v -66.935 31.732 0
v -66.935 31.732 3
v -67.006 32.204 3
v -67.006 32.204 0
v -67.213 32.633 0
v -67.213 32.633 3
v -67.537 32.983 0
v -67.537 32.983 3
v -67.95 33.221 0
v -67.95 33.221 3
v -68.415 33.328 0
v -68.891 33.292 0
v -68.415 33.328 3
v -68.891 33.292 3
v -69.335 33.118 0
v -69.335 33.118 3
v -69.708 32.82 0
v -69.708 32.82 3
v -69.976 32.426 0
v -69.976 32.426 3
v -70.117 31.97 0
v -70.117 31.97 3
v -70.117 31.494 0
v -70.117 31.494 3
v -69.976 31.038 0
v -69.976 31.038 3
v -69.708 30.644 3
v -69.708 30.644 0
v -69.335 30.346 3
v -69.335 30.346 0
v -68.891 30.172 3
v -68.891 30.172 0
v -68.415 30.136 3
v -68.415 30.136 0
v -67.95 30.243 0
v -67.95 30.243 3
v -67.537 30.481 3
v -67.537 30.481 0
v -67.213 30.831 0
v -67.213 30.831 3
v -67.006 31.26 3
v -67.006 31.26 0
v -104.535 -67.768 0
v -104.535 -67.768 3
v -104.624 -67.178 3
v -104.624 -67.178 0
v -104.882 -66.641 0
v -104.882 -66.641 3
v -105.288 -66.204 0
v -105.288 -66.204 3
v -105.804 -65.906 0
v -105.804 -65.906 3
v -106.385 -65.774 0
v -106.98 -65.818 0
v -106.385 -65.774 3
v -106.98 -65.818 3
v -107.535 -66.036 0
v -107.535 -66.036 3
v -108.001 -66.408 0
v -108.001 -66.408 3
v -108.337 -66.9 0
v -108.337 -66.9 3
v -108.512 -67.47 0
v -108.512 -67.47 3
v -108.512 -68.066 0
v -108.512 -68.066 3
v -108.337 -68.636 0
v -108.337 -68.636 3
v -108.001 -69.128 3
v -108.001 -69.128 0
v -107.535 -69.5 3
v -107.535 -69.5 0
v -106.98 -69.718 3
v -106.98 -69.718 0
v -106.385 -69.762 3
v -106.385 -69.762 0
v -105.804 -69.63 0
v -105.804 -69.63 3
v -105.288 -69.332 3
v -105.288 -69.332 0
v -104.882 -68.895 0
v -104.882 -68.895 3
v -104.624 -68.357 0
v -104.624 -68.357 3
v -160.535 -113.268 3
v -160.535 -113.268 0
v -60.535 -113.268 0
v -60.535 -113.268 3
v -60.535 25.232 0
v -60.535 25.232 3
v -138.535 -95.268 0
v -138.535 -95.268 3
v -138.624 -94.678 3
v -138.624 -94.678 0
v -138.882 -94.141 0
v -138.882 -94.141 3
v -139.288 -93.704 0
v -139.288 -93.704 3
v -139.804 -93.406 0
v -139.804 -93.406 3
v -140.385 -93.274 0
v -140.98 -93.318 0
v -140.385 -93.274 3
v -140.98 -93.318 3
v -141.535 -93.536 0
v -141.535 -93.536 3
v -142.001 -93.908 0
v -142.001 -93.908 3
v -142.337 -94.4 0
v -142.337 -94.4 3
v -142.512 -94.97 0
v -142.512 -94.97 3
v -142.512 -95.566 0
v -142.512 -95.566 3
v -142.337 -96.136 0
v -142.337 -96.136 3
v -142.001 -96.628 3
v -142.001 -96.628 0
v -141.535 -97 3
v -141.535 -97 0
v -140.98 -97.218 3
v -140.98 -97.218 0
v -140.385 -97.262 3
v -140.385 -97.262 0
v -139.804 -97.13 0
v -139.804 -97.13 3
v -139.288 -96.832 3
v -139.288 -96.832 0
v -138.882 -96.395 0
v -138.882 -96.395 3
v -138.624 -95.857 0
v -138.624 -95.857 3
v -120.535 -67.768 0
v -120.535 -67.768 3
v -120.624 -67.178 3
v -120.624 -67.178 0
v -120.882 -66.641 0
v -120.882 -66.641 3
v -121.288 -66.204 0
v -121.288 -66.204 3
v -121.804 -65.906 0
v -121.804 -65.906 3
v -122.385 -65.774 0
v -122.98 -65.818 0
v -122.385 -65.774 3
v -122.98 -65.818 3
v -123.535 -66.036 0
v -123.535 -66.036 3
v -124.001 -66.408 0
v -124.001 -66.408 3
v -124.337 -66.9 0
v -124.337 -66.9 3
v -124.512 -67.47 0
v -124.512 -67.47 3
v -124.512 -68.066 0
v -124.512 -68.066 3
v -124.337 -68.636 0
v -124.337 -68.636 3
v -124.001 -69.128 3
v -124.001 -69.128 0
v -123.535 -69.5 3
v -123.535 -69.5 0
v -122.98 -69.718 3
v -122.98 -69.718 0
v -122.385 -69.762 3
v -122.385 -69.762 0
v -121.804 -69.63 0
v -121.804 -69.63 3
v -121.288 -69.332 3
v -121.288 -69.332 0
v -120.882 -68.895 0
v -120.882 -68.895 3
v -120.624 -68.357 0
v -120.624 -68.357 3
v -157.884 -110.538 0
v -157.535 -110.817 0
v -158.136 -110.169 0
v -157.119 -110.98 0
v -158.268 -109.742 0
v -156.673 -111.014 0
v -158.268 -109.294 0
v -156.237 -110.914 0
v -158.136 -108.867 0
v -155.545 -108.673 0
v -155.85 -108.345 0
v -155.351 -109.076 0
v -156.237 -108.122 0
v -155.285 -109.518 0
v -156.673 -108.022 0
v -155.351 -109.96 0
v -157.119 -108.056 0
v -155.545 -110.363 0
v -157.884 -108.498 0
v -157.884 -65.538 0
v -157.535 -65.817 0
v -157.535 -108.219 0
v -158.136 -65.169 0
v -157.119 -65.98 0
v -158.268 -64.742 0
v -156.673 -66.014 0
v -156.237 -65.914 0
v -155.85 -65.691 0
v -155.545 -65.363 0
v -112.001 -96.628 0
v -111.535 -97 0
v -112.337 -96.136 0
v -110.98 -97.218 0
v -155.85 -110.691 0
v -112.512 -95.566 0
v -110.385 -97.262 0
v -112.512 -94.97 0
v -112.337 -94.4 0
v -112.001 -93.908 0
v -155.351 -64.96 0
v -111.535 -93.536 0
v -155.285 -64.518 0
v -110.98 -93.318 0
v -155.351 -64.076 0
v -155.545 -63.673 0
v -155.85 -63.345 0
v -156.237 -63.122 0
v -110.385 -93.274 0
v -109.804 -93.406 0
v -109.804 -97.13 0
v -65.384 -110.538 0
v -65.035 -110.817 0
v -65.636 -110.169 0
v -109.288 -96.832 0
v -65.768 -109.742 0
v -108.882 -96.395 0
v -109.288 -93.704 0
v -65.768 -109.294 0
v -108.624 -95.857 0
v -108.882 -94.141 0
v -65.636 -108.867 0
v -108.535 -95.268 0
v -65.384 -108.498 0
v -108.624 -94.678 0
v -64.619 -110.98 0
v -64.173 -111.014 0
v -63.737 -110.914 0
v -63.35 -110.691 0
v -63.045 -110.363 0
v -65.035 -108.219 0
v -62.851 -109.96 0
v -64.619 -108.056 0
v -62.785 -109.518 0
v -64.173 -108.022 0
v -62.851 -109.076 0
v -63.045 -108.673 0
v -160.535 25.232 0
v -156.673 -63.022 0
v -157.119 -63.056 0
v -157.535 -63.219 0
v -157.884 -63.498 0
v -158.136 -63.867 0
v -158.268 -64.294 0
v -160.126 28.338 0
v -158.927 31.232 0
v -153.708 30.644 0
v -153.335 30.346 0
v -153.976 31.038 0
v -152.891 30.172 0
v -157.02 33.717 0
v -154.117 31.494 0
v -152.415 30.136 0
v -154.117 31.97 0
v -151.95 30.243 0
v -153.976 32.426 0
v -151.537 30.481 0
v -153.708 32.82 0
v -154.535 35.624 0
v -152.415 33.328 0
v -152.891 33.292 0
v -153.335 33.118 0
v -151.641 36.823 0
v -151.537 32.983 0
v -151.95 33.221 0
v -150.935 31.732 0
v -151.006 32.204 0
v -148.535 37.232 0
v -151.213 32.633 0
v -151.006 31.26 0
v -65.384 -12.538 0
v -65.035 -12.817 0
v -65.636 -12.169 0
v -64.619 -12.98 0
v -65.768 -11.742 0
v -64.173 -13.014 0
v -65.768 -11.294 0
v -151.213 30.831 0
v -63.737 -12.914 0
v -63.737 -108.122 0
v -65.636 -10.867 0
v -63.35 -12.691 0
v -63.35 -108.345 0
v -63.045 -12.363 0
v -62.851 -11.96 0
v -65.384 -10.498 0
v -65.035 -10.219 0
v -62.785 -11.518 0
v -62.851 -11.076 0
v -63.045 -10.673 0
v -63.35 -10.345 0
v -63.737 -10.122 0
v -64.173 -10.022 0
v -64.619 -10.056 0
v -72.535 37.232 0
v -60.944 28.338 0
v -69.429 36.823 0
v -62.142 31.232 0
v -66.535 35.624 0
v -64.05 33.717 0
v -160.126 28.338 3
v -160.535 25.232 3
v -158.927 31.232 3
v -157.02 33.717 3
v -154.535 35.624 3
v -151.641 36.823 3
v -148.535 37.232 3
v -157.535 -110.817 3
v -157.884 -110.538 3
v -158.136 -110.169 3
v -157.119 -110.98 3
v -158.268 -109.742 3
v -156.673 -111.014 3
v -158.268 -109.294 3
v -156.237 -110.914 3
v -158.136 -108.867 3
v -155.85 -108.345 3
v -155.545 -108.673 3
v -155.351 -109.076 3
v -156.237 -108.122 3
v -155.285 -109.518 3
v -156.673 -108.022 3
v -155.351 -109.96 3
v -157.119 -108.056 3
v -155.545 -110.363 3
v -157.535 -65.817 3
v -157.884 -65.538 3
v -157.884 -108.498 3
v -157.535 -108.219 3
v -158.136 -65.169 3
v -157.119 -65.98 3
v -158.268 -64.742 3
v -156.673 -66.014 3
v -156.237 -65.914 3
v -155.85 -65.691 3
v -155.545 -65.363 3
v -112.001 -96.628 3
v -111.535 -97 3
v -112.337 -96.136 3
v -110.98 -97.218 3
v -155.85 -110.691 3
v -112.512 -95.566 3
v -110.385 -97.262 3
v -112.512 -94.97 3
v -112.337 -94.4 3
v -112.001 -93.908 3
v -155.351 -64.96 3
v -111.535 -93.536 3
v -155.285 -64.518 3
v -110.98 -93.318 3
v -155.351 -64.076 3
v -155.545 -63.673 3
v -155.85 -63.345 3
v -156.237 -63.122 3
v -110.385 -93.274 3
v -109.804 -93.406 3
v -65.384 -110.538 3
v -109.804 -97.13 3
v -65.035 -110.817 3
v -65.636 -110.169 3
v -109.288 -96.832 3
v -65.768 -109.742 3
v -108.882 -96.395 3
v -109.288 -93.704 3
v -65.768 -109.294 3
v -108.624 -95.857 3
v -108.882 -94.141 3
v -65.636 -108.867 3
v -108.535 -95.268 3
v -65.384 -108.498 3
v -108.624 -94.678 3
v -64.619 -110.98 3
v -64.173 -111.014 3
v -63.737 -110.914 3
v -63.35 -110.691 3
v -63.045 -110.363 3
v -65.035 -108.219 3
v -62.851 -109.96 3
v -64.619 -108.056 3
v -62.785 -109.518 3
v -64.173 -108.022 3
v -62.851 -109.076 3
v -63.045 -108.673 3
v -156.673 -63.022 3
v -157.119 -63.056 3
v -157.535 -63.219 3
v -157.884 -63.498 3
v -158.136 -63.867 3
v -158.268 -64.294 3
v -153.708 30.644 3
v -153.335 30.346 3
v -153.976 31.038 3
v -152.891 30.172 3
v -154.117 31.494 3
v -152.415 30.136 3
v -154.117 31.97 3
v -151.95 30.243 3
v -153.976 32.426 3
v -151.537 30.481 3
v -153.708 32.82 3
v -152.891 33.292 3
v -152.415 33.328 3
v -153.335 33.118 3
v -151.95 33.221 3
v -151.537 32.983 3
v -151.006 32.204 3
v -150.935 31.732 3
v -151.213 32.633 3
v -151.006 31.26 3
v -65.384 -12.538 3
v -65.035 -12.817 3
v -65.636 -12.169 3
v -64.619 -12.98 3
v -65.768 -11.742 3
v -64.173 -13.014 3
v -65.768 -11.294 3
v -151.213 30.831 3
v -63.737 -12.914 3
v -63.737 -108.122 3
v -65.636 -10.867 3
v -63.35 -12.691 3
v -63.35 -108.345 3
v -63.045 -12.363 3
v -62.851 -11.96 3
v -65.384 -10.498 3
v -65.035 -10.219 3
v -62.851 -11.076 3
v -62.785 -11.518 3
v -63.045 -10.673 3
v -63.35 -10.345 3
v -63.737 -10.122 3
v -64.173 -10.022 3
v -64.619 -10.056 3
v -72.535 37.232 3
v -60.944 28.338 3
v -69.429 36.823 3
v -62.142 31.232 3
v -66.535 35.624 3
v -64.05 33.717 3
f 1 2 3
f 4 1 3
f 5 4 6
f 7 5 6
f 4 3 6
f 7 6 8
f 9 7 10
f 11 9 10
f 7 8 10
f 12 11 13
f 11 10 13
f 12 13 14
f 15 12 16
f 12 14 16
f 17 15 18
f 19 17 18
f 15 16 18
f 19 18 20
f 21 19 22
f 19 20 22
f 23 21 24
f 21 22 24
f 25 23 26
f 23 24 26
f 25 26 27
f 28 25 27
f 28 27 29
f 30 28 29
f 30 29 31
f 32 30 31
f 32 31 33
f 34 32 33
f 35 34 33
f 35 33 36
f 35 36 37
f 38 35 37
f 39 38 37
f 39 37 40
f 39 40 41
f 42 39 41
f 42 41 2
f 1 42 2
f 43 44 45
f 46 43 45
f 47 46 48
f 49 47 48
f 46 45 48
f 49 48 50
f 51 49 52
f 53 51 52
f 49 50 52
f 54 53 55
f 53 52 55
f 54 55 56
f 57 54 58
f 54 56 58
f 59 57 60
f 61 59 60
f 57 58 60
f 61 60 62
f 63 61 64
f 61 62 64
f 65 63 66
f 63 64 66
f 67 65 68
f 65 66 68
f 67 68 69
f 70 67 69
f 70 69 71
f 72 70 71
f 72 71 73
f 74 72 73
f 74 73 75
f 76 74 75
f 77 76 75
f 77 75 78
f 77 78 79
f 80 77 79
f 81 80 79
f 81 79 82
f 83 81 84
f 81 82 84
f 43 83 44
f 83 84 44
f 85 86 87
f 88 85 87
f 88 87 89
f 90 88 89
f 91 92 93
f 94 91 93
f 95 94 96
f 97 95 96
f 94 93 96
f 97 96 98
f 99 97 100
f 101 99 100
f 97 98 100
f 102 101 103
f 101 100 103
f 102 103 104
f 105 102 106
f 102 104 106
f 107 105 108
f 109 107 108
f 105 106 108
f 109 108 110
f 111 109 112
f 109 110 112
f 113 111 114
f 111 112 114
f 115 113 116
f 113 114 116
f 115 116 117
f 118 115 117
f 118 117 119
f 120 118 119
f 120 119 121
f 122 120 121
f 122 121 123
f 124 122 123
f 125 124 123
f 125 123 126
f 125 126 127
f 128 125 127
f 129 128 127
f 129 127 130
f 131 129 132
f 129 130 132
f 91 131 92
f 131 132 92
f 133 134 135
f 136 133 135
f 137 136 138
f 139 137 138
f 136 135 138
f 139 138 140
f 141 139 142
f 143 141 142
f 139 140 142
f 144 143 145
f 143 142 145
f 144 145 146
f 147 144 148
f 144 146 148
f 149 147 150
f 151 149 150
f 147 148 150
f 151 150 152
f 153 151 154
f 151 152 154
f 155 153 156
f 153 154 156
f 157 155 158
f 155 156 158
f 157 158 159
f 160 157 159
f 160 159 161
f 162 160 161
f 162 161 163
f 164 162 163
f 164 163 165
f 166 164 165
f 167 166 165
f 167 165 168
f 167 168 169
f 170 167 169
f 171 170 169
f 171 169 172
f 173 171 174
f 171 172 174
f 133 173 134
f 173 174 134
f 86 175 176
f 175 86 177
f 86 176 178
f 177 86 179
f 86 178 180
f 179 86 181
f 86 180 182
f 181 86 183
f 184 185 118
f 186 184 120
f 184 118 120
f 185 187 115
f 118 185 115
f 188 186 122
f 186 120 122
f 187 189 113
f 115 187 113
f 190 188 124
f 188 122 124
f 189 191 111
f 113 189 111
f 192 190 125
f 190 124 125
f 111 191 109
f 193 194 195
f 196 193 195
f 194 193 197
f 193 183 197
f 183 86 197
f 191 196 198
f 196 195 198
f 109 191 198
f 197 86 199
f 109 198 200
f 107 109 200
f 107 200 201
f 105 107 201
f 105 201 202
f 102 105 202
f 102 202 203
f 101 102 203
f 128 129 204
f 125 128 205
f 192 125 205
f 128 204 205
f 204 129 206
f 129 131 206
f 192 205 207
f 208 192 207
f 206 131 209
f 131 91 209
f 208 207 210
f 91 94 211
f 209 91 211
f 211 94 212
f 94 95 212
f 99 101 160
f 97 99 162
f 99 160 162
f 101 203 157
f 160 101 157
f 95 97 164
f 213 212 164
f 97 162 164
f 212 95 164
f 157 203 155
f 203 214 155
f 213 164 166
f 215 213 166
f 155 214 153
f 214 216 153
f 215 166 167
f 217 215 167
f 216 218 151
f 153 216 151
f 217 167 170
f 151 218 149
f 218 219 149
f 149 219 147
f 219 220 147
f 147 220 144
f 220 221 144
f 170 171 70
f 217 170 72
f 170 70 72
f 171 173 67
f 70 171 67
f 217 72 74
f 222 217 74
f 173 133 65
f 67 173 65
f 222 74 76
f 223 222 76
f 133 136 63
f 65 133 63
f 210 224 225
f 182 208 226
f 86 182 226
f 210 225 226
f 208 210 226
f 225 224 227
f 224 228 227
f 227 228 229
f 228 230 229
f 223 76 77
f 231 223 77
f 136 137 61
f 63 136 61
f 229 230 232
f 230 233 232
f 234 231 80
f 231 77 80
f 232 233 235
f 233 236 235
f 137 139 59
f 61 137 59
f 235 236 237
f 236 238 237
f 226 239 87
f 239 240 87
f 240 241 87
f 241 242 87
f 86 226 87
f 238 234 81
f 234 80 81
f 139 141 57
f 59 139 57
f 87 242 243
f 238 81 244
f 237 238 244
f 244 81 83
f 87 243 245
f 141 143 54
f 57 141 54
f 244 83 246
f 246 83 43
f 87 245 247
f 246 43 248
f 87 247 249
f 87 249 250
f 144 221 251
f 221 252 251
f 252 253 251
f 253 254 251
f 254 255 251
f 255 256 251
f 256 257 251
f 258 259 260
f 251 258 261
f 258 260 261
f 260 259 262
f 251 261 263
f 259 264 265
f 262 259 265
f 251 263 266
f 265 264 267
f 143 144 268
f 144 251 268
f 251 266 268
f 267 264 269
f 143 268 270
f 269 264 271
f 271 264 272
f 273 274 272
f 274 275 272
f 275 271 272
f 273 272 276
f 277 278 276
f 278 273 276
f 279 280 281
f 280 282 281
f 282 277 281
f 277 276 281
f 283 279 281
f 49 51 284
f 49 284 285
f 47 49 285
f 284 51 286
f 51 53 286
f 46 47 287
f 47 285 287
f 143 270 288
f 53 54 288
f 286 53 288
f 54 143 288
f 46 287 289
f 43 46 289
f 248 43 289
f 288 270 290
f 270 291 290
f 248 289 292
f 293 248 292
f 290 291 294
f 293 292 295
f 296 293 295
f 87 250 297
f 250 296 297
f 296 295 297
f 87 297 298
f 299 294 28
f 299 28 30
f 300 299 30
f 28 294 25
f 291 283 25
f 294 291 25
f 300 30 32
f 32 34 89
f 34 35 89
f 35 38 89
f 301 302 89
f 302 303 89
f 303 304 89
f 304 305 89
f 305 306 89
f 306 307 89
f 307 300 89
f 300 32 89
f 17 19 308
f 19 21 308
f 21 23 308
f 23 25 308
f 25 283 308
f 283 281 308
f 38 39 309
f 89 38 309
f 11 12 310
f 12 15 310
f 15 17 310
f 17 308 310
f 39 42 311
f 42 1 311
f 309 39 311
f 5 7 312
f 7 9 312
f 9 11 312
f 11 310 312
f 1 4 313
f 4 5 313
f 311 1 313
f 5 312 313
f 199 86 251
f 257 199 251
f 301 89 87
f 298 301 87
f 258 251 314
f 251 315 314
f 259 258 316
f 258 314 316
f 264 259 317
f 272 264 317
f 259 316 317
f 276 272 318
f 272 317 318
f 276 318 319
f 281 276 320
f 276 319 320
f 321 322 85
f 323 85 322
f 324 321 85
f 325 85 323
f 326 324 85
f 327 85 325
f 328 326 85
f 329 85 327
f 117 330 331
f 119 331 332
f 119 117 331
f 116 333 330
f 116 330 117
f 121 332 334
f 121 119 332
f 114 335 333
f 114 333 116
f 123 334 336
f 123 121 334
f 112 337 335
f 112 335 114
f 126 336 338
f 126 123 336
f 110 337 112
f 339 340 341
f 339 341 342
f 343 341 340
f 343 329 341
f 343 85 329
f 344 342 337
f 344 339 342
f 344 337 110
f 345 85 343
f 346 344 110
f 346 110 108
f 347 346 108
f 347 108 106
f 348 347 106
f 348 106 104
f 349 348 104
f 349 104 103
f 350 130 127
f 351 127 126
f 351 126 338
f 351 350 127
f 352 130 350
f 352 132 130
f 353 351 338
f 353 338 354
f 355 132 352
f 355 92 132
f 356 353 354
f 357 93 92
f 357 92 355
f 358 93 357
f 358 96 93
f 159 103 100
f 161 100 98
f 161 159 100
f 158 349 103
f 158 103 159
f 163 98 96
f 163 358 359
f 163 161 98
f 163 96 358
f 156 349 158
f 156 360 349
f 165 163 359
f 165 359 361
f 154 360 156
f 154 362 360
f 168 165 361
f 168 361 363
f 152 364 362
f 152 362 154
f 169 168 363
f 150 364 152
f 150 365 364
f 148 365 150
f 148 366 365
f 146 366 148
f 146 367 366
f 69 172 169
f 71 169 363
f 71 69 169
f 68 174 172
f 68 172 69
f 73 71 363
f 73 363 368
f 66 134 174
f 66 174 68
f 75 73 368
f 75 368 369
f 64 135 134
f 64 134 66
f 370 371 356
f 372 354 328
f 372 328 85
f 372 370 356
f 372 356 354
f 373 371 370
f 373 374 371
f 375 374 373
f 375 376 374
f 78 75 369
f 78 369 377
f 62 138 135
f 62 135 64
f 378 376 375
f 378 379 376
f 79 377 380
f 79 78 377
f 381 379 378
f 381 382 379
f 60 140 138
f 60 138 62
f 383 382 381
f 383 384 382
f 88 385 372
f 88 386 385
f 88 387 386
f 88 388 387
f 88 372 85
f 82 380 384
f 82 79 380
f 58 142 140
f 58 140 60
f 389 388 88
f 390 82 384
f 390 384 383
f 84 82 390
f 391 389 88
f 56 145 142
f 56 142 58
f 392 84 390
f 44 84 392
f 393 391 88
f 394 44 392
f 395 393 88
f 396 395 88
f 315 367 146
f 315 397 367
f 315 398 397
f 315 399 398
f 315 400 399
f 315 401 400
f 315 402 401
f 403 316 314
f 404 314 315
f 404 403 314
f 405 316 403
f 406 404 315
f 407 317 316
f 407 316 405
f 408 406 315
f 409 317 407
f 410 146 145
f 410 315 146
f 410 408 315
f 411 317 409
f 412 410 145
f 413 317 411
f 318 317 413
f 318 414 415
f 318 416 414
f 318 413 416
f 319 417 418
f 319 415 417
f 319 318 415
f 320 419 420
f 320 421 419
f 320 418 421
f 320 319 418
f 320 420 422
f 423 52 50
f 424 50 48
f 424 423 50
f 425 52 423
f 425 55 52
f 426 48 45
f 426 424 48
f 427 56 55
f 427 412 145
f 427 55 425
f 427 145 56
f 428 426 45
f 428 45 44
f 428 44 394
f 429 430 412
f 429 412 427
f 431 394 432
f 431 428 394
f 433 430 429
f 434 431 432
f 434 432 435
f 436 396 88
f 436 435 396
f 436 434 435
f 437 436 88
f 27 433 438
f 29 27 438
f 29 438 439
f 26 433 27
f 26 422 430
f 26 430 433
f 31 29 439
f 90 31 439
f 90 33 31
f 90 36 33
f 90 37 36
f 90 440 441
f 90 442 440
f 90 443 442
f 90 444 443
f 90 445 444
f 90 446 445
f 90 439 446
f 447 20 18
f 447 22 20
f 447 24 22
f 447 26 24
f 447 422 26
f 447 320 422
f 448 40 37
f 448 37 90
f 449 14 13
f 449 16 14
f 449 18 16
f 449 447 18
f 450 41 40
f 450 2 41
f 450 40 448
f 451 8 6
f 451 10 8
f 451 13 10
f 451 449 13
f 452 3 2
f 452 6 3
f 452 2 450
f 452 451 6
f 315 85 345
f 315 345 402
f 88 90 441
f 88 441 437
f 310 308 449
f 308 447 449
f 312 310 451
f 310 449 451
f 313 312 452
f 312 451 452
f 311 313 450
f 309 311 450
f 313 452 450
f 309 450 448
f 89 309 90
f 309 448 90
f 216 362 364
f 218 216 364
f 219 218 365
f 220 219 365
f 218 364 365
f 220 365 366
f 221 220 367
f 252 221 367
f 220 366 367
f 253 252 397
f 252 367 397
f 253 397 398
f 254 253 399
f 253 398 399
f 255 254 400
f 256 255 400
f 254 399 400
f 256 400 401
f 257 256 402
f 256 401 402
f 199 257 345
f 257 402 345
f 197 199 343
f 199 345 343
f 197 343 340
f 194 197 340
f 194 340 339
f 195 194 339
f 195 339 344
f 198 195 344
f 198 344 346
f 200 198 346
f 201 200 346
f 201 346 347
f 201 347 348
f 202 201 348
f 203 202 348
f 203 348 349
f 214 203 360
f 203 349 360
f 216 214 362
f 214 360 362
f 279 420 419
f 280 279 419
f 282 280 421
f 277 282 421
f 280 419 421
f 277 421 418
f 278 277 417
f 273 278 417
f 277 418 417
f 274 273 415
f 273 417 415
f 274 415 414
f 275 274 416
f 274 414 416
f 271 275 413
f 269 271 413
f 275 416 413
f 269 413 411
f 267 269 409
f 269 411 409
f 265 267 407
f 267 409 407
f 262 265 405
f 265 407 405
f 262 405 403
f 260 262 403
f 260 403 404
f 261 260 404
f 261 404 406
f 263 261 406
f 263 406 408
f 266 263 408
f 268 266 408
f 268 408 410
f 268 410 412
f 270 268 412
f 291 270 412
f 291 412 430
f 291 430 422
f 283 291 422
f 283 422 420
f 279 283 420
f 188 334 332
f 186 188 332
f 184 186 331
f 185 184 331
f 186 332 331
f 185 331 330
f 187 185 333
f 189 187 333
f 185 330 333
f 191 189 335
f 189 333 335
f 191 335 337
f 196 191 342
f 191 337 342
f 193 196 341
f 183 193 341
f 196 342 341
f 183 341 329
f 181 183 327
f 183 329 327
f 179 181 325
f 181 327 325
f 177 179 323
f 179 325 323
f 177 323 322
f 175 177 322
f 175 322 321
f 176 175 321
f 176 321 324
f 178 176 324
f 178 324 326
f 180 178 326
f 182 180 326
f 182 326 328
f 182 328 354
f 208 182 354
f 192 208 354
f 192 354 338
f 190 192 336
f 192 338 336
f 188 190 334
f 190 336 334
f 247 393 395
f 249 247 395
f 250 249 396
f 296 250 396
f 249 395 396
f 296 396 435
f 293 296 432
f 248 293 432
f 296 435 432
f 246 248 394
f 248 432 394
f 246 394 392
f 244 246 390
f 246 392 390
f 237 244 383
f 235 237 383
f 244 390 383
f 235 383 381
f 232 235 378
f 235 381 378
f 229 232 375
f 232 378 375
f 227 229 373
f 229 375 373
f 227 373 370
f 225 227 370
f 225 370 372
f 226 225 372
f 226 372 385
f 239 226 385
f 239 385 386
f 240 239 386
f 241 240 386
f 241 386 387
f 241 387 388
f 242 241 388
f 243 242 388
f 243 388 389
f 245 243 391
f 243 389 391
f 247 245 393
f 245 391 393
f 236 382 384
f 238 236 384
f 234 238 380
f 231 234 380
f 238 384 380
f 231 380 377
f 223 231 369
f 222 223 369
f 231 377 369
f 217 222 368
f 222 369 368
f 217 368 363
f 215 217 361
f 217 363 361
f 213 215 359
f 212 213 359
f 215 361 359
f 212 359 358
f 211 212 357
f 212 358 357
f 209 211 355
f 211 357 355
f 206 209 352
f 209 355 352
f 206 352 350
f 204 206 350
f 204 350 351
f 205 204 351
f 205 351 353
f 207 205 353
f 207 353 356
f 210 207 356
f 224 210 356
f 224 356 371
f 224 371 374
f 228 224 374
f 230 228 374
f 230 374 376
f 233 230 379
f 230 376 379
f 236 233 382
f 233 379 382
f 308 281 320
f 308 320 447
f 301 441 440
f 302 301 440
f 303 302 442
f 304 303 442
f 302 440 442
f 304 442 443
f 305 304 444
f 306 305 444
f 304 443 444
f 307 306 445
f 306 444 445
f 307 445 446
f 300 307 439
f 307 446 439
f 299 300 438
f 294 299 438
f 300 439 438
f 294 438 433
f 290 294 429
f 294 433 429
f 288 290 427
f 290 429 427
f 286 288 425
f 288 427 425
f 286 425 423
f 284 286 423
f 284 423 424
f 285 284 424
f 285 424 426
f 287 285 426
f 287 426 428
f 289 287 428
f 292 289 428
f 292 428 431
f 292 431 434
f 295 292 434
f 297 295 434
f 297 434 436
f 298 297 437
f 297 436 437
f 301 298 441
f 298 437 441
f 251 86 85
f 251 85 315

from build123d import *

# Parameters (mm, degrees)
SKETCH1_W           = 100
SKETCH1_H           = 150.5
BOSS_EXTRUDE1_DEPTH = 3
SKETCH2_R           = 1.5
CUT_EXTRUDE1_DEPTH  = 3
SKETCH3_R           = 2
CUT_EXTRUDE2_DEPTH  = 3
FILLET1_R           = 12
SKETCH4_R           = 1.6
CUT_EXTRUDE3_DEPTH  = 10


with BuildPart() as part:
    # Sketch1 → Boss-Extrude1 (new body)
    with BuildSketch(Plane.XY):
        with Locations((-110.534791728, -38.017977095)):
            Rectangle(SKETCH1_W, SKETCH1_H)
    extrude(amount=BOSS_EXTRUDE1_DEPTH)

    # Sketch2 → Cut-Extrude1 (cut)
    with BuildSketch(Plane.XY.offset(3)):
        with Locations((-156.784791728, -109.517977095)):
            Circle(SKETCH2_R)
        with Locations((-64.284791728, -109.517977095)):
            Circle(SKETCH2_R)
        with Locations((-64.284791728, -11.517977095)):
            Circle(SKETCH2_R)
        with Locations((-156.784791728, -64.517977095)):
            Circle(SKETCH2_R)
    extrude(amount=-CUT_EXTRUDE1_DEPTH, mode=Mode.SUBTRACT)

    # Sketch3 → Cut-Extrude2 (cut)
    with BuildSketch(Plane.XY.offset(3)):
        with Locations((-140.534791728, -95.267977095)):
            Circle(SKETCH3_R)
        with Locations((-110.534791728, -95.267977095)):
            Circle(SKETCH3_R)
        with Locations((-106.534791728, -67.767977095)):
            Circle(SKETCH3_R)
        with Locations((-122.534791728, -67.767977095)):
            Circle(SKETCH3_R)
    extrude(amount=-CUT_EXTRUDE2_DEPTH, mode=Mode.SUBTRACT)

    # Fillet1
    fillet1_edges = [part.edges().sort_by_distance(p)[0] for p in [
        (-160.534791728, 37.232022905, 1.5),
        (-60.534791728, 37.232022905, 1.5),
    ]]
    fillet(fillet1_edges, radius=FILLET1_R)

    # Sketch4 → Cut-Extrude3 (cut)
    with BuildSketch(Plane.XY.offset(3)):
        with Locations((-152.534791728, 31.732022905)):
            Circle(SKETCH4_R)
        with Locations((-68.534791728, 31.732022905)):
            Circle(SKETCH4_R)
    extrude(amount=-CUT_EXTRUDE3_DEPTH, mode=Mode.SUBTRACT)


solid = part.part
